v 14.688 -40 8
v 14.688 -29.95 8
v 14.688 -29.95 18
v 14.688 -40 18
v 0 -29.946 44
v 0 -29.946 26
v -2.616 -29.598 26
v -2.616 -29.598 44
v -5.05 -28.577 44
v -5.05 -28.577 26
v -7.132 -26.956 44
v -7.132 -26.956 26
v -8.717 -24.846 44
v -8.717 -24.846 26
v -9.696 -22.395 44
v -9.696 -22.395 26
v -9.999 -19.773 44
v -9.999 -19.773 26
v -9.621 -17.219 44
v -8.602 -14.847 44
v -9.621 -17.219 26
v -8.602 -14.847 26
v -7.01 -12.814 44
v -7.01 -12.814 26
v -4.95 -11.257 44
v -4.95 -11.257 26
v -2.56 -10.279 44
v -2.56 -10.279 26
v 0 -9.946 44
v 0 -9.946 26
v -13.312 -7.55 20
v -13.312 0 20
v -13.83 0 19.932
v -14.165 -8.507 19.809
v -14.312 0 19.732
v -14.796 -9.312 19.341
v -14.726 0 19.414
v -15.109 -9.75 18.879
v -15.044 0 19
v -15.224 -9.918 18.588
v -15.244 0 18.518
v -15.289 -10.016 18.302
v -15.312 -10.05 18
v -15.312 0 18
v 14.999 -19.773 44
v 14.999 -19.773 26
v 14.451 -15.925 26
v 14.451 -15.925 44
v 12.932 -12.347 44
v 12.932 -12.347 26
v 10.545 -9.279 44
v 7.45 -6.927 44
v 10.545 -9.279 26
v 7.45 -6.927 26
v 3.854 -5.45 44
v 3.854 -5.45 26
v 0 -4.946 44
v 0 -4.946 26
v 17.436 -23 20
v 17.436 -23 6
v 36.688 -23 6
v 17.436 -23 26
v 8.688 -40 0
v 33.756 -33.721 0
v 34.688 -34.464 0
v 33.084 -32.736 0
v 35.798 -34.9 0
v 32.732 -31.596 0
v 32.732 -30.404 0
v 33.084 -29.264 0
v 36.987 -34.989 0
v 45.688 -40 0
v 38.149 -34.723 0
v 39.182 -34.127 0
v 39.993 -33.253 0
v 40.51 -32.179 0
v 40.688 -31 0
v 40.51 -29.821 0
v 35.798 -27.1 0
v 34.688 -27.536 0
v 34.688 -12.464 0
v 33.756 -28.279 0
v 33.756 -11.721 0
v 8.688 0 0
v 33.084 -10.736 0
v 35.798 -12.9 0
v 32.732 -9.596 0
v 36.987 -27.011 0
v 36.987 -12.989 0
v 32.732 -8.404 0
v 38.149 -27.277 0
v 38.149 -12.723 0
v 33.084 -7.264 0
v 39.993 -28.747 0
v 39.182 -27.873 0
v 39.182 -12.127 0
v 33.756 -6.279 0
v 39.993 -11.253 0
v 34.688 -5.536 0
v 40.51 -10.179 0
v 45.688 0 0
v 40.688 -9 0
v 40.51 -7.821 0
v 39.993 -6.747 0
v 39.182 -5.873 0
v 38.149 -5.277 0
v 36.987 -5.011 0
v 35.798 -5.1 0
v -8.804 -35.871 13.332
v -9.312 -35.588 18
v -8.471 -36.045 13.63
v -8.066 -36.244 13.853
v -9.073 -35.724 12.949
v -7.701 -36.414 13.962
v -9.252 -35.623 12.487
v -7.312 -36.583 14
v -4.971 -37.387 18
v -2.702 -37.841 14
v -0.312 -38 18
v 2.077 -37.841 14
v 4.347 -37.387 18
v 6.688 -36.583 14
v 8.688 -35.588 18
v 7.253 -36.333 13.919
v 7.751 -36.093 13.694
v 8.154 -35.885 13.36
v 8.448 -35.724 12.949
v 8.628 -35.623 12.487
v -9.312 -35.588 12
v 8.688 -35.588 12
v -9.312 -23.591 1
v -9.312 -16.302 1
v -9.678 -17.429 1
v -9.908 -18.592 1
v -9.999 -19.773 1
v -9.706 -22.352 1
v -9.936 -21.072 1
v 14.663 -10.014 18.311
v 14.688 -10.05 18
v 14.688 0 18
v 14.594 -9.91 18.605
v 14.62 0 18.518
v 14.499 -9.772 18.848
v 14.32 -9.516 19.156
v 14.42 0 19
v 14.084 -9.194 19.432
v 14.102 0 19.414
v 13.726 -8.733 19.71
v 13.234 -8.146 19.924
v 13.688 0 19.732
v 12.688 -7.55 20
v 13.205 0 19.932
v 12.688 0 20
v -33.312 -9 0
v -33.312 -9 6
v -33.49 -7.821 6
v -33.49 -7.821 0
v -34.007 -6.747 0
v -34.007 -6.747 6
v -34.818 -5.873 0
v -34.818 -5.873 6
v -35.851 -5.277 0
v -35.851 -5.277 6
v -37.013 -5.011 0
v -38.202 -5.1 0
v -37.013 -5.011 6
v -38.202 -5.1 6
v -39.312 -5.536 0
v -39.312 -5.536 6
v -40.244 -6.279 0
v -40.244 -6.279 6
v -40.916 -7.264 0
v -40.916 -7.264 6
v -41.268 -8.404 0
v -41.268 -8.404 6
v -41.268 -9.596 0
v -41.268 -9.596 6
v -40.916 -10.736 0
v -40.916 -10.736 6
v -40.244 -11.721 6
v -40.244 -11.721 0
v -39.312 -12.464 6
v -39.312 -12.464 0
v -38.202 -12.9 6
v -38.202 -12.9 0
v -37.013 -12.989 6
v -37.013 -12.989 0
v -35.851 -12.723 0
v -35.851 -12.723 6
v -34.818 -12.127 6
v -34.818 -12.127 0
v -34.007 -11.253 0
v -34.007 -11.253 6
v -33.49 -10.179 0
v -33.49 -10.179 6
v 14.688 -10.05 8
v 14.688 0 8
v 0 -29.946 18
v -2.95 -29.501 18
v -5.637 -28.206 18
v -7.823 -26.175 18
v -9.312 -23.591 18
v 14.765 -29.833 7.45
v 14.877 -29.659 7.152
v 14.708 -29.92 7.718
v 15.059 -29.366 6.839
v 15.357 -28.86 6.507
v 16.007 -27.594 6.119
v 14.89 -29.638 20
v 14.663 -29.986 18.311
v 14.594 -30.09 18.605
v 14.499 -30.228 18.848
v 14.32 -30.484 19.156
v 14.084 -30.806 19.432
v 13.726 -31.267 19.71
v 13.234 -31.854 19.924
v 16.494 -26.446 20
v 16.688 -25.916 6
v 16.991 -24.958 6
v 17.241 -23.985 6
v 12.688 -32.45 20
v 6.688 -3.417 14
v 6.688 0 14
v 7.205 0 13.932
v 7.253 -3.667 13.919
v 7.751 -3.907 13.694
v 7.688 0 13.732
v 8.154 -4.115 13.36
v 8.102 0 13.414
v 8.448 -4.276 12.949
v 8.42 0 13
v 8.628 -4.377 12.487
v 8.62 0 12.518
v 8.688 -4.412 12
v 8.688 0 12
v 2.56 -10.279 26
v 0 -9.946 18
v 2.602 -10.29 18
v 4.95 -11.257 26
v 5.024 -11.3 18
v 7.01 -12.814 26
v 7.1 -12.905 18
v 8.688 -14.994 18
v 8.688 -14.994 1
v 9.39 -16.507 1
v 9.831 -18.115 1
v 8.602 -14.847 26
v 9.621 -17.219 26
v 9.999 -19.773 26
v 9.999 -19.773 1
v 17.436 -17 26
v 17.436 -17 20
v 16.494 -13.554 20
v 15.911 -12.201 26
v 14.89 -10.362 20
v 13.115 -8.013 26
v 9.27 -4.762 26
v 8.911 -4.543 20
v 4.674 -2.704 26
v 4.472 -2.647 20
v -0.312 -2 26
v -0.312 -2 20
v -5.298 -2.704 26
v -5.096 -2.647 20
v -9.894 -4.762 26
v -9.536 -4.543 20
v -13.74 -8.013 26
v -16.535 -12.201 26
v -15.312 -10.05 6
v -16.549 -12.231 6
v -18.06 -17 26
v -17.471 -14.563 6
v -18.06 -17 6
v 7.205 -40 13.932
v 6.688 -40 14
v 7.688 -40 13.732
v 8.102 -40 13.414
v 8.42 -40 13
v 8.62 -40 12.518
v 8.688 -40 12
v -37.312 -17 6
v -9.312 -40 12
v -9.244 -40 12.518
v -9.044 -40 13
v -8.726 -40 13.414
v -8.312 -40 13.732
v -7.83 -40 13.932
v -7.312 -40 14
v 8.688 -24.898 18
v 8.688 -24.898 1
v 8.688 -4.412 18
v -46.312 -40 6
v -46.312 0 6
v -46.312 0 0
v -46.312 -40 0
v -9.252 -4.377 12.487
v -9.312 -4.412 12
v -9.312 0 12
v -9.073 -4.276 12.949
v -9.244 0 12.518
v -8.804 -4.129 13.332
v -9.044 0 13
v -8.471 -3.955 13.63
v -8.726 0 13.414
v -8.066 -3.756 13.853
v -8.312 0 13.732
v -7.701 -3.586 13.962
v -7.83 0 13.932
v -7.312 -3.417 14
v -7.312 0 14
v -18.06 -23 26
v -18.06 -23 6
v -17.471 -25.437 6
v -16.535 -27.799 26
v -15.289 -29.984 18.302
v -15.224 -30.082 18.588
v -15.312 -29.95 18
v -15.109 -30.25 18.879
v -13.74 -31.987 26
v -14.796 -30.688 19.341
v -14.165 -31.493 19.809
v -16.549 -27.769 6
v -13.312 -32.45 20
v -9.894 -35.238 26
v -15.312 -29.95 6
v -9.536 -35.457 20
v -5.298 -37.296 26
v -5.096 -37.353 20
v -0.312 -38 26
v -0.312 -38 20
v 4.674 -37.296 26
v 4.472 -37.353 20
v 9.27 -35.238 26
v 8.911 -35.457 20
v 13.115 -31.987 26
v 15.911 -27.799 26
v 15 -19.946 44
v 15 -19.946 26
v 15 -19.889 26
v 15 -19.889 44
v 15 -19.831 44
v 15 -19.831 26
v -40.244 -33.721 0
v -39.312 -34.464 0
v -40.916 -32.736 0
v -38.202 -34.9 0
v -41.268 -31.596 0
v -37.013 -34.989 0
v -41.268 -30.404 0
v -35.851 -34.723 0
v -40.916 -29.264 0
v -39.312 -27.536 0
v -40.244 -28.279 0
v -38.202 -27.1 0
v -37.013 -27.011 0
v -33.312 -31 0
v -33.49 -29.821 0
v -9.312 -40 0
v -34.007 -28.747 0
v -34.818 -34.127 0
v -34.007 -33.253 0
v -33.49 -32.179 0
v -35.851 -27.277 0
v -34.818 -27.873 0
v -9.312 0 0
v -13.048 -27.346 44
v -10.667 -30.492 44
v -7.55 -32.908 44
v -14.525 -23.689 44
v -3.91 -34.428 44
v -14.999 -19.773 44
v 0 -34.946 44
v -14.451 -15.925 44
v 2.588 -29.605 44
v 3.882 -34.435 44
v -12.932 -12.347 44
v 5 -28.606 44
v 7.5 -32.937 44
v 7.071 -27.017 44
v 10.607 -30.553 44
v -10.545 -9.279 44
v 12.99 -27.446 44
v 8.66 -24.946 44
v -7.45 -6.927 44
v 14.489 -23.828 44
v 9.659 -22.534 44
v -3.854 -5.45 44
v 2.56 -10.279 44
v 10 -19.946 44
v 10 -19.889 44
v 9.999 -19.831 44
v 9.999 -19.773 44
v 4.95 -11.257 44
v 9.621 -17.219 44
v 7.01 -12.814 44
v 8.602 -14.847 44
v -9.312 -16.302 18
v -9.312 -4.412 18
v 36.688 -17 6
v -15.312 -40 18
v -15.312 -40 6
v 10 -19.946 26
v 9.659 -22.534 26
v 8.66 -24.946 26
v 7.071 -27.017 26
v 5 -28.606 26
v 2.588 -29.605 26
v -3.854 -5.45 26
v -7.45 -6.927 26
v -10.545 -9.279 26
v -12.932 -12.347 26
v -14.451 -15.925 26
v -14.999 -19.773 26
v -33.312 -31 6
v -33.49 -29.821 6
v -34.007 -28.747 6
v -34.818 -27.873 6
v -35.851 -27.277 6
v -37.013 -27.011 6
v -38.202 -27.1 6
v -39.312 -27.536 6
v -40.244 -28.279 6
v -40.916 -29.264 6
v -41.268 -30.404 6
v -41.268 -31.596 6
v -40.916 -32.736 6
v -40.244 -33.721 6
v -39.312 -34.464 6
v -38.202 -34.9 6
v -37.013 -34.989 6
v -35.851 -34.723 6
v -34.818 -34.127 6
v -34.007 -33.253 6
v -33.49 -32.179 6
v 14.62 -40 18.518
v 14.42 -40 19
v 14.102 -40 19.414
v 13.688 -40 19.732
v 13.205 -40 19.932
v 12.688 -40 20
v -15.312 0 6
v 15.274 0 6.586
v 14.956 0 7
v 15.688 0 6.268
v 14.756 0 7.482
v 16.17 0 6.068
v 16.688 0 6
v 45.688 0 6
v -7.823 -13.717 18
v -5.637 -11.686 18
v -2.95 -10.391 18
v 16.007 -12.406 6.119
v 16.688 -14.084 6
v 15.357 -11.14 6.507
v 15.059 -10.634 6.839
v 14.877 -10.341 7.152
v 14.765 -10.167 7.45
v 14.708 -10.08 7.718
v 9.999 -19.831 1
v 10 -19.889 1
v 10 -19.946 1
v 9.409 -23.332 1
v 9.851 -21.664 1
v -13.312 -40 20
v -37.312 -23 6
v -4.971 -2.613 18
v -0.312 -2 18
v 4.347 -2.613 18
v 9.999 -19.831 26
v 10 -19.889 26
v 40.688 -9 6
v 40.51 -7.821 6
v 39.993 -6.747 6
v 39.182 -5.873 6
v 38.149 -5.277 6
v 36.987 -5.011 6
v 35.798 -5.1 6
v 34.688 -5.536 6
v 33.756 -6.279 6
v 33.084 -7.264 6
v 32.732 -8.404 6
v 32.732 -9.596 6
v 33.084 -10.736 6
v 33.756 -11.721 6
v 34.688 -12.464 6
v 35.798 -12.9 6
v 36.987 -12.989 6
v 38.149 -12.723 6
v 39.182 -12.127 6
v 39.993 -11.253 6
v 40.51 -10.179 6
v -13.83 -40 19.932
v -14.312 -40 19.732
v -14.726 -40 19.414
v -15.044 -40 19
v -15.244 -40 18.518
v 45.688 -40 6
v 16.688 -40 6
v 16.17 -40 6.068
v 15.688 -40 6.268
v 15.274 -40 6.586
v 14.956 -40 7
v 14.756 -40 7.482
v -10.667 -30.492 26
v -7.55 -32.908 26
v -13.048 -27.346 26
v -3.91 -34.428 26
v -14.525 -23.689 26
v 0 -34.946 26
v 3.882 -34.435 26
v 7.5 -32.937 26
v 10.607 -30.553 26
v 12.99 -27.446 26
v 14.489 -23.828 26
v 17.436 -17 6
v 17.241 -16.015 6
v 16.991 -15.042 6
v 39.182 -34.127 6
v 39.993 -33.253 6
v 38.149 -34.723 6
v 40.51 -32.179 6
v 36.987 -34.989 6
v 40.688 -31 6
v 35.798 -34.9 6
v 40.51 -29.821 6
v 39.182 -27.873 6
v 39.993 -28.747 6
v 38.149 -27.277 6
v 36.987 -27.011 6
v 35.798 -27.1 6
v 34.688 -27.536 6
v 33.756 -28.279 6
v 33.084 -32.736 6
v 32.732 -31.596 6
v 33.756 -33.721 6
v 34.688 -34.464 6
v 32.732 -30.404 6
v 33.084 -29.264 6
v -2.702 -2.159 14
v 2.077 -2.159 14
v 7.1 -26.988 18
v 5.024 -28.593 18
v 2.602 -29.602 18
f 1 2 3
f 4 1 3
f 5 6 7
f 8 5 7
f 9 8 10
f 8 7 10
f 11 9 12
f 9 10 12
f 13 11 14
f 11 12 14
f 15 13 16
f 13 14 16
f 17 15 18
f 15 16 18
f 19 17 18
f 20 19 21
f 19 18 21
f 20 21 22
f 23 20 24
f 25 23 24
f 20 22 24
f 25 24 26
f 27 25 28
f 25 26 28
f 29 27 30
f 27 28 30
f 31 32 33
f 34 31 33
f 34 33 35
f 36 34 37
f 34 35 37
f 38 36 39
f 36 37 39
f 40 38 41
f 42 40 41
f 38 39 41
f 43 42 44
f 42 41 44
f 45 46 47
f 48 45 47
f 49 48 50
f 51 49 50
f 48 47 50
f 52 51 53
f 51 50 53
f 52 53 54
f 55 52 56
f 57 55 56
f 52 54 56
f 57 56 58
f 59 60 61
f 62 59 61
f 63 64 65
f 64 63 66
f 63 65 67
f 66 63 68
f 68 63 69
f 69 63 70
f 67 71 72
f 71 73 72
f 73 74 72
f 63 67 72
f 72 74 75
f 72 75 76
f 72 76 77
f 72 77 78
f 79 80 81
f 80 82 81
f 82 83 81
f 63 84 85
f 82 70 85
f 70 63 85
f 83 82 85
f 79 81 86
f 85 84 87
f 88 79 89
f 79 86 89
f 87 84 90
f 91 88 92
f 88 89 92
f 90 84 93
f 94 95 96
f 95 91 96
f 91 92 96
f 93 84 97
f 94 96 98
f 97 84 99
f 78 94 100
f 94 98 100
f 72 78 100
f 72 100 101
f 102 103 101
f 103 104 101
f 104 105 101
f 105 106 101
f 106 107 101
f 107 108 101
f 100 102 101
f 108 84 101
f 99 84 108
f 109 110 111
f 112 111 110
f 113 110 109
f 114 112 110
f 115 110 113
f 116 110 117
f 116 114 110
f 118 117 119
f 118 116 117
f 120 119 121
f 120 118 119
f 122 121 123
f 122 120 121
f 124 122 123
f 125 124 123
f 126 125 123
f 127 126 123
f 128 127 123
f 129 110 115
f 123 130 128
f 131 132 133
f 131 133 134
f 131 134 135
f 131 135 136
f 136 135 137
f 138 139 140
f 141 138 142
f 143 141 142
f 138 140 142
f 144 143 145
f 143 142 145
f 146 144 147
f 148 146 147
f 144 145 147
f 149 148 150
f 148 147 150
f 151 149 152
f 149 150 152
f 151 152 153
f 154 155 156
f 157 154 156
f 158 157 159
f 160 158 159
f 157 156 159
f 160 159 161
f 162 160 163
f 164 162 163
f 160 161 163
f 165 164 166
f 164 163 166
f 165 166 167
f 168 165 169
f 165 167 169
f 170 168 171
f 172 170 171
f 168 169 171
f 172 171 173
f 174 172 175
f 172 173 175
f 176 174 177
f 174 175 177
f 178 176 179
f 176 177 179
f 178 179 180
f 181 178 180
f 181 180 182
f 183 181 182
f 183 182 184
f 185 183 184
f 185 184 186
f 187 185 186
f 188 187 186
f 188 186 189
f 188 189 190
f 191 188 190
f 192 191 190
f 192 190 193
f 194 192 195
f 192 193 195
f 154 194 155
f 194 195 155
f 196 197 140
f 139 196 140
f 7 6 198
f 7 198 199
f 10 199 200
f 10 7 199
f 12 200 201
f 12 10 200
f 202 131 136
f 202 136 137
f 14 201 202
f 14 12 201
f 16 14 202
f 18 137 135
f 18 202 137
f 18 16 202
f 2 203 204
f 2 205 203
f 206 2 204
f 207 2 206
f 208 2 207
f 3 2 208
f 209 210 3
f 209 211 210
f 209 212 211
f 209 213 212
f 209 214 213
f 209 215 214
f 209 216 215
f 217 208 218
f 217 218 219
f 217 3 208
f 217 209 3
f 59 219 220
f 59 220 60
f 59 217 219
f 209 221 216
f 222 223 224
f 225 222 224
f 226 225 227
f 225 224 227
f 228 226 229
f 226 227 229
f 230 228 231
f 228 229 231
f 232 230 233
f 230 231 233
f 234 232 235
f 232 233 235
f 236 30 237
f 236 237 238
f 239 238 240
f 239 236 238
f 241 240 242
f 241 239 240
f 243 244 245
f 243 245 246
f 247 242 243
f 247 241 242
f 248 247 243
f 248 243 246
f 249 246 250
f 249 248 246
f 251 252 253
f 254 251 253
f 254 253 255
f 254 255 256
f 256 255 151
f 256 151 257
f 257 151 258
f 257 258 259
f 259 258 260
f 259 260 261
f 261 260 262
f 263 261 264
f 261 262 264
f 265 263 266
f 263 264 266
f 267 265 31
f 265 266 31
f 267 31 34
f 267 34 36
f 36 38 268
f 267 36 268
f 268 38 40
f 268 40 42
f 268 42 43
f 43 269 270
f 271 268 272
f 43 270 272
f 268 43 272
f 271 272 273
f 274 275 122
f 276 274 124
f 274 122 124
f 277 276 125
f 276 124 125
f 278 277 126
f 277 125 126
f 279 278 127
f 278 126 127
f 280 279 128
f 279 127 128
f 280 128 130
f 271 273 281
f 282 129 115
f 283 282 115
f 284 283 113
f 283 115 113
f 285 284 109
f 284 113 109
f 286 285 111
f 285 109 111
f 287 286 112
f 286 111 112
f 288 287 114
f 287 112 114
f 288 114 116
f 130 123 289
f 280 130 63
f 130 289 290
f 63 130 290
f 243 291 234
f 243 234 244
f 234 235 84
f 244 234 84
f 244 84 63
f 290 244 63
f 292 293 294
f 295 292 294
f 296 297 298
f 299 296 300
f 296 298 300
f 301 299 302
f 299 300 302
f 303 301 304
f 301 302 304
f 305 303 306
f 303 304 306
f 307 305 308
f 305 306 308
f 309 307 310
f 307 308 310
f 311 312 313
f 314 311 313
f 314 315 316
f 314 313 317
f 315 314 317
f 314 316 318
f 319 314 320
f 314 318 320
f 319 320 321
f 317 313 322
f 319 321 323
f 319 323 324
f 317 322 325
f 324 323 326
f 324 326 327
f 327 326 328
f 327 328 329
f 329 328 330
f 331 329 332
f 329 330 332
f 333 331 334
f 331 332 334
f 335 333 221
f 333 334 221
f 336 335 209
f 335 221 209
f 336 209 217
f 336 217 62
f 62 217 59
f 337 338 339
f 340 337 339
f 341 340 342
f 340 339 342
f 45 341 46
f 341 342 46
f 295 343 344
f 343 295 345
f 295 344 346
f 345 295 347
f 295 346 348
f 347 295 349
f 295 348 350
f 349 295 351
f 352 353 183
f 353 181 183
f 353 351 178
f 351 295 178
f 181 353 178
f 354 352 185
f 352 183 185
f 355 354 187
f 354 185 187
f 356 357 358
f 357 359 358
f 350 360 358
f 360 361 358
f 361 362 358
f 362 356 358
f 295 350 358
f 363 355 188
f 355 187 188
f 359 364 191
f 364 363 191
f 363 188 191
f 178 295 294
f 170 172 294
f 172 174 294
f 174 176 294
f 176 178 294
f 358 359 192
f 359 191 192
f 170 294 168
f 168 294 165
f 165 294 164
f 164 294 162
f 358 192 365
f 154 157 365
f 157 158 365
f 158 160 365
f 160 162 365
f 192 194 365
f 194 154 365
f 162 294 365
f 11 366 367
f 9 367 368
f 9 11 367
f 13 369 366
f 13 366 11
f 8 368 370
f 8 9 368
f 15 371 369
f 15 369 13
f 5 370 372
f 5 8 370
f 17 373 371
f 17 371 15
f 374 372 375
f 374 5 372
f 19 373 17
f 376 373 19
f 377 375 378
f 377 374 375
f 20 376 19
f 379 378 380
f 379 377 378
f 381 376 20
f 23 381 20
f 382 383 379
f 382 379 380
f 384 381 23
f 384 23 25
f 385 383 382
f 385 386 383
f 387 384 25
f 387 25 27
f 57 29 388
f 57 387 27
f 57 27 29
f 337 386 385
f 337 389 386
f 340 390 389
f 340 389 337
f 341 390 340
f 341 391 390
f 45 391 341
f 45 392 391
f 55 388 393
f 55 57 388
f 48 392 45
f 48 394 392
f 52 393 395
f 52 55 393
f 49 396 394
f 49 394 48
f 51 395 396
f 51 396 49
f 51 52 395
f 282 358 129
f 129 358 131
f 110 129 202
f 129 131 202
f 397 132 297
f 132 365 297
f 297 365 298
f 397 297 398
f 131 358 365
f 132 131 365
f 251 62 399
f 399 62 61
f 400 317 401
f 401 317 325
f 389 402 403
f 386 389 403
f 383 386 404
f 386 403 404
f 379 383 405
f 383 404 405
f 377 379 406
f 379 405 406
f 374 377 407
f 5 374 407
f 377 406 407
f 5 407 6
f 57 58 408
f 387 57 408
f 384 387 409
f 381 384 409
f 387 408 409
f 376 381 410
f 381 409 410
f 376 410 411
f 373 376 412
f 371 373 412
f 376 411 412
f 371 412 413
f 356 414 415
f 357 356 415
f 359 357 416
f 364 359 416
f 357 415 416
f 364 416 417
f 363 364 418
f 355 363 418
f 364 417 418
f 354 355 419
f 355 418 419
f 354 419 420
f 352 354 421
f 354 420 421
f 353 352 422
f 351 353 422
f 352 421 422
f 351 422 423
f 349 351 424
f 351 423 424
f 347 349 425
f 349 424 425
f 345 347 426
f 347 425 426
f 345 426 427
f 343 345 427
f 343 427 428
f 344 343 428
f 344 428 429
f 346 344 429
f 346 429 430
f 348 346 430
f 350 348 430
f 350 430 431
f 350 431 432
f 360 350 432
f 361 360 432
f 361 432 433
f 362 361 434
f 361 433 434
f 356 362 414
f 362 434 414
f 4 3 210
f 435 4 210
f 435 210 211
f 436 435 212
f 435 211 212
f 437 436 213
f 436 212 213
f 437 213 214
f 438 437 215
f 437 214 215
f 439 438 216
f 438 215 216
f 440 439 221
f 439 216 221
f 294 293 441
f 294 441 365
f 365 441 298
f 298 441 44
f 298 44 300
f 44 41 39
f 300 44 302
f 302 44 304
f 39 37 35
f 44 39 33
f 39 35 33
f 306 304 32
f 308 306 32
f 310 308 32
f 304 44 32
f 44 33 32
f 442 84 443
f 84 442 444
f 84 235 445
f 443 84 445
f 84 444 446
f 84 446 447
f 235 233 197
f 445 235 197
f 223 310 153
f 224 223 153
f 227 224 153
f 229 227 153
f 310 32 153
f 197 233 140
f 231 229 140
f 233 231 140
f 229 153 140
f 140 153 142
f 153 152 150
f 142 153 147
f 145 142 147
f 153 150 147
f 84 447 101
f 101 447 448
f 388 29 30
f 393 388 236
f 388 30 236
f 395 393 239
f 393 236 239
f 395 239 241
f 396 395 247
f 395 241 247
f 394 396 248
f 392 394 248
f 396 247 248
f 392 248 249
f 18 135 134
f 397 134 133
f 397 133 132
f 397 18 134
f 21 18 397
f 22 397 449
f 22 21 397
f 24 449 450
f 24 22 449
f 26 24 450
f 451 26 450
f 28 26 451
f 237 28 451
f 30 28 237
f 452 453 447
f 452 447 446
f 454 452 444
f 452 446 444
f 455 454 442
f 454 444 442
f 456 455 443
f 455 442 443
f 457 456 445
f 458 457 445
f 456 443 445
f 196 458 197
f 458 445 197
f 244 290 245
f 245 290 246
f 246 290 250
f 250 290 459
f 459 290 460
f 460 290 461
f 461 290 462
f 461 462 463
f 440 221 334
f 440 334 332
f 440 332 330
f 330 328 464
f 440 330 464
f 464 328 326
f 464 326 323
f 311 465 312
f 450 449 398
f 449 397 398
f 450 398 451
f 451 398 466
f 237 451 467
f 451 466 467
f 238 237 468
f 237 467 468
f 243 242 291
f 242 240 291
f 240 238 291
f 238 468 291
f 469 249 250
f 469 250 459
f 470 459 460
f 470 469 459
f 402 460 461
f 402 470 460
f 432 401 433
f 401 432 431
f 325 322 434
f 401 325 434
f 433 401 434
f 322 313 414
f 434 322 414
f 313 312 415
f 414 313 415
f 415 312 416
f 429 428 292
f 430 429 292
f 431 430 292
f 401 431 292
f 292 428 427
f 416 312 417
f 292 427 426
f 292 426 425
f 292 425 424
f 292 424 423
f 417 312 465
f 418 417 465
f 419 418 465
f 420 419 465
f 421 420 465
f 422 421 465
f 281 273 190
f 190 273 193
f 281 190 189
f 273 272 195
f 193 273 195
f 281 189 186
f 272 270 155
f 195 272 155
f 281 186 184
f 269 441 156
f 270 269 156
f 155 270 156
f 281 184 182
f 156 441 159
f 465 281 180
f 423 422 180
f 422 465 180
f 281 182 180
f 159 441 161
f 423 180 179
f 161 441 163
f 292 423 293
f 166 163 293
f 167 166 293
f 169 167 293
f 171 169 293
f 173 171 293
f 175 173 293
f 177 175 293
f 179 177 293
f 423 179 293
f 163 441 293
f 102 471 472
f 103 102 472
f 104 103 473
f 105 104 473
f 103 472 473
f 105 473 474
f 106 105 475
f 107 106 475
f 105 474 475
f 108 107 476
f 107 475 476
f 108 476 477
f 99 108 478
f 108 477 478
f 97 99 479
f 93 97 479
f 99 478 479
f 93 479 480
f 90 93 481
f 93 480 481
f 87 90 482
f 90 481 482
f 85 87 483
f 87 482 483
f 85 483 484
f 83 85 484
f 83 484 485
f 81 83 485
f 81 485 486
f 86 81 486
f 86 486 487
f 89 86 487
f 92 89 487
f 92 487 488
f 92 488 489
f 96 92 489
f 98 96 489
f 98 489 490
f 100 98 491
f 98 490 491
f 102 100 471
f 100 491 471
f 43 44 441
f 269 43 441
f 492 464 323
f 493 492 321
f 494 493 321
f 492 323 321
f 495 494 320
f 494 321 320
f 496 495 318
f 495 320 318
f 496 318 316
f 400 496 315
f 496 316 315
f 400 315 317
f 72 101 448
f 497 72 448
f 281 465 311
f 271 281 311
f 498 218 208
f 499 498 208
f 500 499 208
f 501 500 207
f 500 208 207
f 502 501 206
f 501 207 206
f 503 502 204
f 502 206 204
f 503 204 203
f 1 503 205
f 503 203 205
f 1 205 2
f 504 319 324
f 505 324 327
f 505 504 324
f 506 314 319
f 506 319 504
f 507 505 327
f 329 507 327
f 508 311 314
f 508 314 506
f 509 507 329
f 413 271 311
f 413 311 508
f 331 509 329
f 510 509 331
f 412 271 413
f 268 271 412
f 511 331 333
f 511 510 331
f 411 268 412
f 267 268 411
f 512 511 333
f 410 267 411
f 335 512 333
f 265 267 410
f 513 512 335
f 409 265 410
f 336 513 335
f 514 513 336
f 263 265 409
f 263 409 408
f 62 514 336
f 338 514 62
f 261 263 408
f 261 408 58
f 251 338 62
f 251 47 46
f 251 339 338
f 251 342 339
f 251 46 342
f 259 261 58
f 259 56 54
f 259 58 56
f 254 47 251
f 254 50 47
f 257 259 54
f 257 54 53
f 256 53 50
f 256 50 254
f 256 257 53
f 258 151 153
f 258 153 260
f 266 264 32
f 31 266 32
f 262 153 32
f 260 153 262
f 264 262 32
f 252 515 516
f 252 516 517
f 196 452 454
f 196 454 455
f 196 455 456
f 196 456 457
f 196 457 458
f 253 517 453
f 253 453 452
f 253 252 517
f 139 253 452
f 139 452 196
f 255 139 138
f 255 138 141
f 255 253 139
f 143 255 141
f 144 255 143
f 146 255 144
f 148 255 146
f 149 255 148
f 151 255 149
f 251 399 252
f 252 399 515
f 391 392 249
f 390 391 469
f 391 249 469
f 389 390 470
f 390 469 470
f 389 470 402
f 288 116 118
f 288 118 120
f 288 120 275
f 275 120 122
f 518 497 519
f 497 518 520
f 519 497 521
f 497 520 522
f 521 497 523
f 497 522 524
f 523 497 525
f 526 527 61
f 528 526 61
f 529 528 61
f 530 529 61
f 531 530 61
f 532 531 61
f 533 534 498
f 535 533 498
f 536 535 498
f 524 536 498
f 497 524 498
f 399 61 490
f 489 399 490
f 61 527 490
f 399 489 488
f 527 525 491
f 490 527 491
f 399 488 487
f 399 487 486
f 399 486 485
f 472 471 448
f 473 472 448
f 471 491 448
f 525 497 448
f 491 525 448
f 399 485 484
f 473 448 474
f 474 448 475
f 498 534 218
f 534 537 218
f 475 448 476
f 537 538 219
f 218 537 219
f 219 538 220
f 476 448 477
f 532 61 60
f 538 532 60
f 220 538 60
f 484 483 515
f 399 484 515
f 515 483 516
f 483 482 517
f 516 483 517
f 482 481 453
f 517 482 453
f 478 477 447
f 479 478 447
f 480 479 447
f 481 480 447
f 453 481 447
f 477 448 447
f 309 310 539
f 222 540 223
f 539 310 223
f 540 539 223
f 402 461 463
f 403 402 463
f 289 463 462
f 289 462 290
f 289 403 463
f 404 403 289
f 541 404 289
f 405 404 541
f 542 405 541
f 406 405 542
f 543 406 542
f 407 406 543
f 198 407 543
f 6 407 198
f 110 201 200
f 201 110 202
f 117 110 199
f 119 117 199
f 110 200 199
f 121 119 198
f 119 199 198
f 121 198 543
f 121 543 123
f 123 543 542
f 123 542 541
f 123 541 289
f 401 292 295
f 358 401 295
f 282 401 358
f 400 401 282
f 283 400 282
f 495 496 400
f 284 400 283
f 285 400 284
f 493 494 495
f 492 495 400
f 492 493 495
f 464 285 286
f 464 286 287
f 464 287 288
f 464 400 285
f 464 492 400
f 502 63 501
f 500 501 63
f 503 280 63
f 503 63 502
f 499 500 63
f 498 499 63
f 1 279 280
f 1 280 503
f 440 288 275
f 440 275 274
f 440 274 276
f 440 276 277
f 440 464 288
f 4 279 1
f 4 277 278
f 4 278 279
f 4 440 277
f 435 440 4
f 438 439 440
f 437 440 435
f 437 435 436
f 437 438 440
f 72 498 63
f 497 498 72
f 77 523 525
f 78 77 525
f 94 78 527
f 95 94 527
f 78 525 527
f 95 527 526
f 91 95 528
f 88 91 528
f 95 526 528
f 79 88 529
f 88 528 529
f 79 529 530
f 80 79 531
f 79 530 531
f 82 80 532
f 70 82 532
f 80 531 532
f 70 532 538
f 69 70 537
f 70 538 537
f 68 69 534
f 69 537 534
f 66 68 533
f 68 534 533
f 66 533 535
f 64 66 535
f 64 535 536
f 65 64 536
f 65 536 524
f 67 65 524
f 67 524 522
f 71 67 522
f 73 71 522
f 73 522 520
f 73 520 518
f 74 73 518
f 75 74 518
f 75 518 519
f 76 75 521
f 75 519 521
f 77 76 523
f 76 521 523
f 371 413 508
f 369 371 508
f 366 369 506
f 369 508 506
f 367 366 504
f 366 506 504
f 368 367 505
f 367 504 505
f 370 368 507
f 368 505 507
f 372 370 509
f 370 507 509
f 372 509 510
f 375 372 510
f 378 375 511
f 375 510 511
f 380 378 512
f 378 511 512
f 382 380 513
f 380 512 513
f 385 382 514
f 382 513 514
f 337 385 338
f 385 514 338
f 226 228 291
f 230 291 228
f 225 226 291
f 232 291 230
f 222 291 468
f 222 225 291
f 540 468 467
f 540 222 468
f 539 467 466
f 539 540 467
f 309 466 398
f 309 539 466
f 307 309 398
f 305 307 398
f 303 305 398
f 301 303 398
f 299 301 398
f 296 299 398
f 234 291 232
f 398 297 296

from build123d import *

# Parameters (mm, degrees)
F1_DEPTH  = 40
F14_R     = 4
F2_DEPTH  = 6
F3_R      = 4
F15_DEPTH = 6
F16_DEPTH = 14
F6_DEPTH  = 6
F17_DEPTH = 18
F18_DEPTH = 25
F8_DEPTH  = 20
F9_DEPTH  = 20
F10_DEPTH = 6
F12_DEPTH = 6
F13_DEPTH = 12


with BuildPart() as f1:
    # F0 (on Front) → F1 (new body)
    with BuildSketch(Plane.XZ):
        with BuildLine():
            Line((8.6878103536, 0), (45.6878103536, 0))
            Line((45.6878103536, 0), (45.6878103536, 6))
            Line((45.6878103536, 6), (16.6878103536, 6))
            ThreePointArc((16.6878103536, 6), (15.2735967912, 6.5857864376), (14.6878103536, 8))
            Line((14.6878103536, 8), (14.6878103536, 18))
            ThreePointArc((14.6878103536, 18), (14.102023916, 19.4142135624), (12.6878103536, 20))
            Line((12.6878103536, 20), (-13.3121896464, 20))
            ThreePointArc((-13.3121896464, 20), (-14.7264032088, 19.4142135624), (-15.3121896464, 18))
            Line((-15.3121896464, 18), (-15.3121896464, 6))
            Line((-15.3121896464, 6), (-46.3121896464, 6))
            Line((-46.3121896464, 6), (-46.3121896464, 0))
            Line((-46.3121896464, 0), (-9.3121896464, 0))
            Line((-9.3121896464, 0), (-9.3121896464, 12))
            ThreePointArc((-9.3121896464, 12), (-8.7264032088, 13.4142135624), (-7.3121896464, 14))
            Line((-7.3121896464, 14), (6.6878103536, 14))
            ThreePointArc((6.6878103536, 14), (8.102023916, 13.4142135624), (8.6878103536, 12))
            Line((8.6878103536, 12), (8.6878103536, 0))
        make_face()
    extrude(amount=F1_DEPTH)

    # F14 (on face) → F2 (cut)
    with BuildSketch(Plane.XY.offset(6)):
        with Locations((-37.3121896464, -31)):
            Circle(F14_R)
        with Locations((-37.3121896464, -9)):
            Circle(F14_R)
    extrude(amount=-F2_DEPTH, mode=Mode.SUBTRACT)

    # F3 (on face) → F15 (cut)
    with BuildSketch(Plane.XY.offset(6)):
        with Locations((36.6878103536, -31)):
            Circle(F3_R)
        with Locations((36.6878103536, -9)):
            Circle(F3_R)
    extrude(amount=-F15_DEPTH, mode=Mode.SUBTRACT)

    # F4 (on face) → F16 (join)
    with BuildSketch(Plane.XY.offset(20)):
        with BuildLine():
            Line((12.6878103536, -32.449899598), (12.6878103536, -7.550100402))
            ThreePointArc((12.6878103536, -7.550100402), (-0.3121896464, -2), (-13.3121896464, -7.550100402))
            Line((-13.3121896464, -7.550100402), (-13.3121896464, -32.449899598))
            ThreePointArc((-13.3121896464, -32.449899598), (-0.3121896464, -38), (12.6878103536, -32.449899598))
        make_face()
        with BuildLine():
            Line((-13.3121896464, -32.449899598), (-13.3121896464, -7.550100402))
            ThreePointArc((-13.3121896464, -7.550100402), (-18.3121896464, -20), (-13.3121896464, -32.449899598))
        make_face()
        with BuildLine():
            ThreePointArc((12.6878103536, -32.449899598), (16.3911034421, -26.7082039325), (17.6878103536, -20))
            ThreePointArc((17.6878103536, -20), (16.3911034421, -13.2917960675), (12.6878103536, -7.550100402))
            Line((12.6878103536, -7.550100402), (12.6878103536, -32.449899598))
        make_face()
    extrude(amount=-F16_DEPTH)

    # F5 (on face) → F6 (join)
    with BuildSketch(Plane.XY.offset(20)):
        with BuildLine():
            ThreePointArc((12.6878103536, -32.449899598), (16.3911034421, -26.7082039325), (17.6878103536, -20))
            ThreePointArc((17.6878103536, -20), (16.3911034421, -13.2917960675), (12.6878103536, -7.550100402))
            ThreePointArc((12.6878103536, -7.550100402), (-0.3121896464, -2), (-13.3121896464, -7.550100402))
            ThreePointArc((-13.3121896464, -7.550100402), (-18.3121896464, -20), (-13.3121896464, -32.449899598))
            ThreePointArc((-13.3121896464, -32.449899598), (-0.3121896464, -38), (12.6878103536, -32.449899598))
        make_face()
    extrude(amount=F6_DEPTH)

    # F7 (on face) → F17 (join)
    with BuildSketch(Plane.XY.offset(26)):
        with BuildLine():
            Line((-9.9985091191, -19.7734791318), (-14.9990061206, -19.7734791318))
            ThreePointArc((-14.9990061206, -19.7734791318), (-10.6674755741, -30.4915269508), (0, -34.9461504817))
            Line((0, -34.9461504817), (0, -29.9461504817))
            ThreePointArc((0, -29.9461504817), (-7.1318550707, -26.9559039189), (-9.9985091191, -19.7734791318))
        make_face()
        with BuildLine():
            ThreePointArc((15, -19.9461504817), (14.9997515281, -19.8598133766), (14.9990061206, -19.7734791318))
            Line((14.9990061206, -19.7734791318), (9.9985091191, -19.7734791318))
            ThreePointArc((9.9985091191, -19.7734791318), (9.9996272728, -19.8598115887), (10, -19.9461504817))
            ThreePointArc((10, -19.9461504817), (7.0710678119, -27.0172182936), (0, -29.9461504817))
            Line((0, -29.9461504817), (0, -34.9461504817))
            ThreePointArc((0, -34.9461504817), (10.6066017178, -30.5527521995), (15, -19.9461504817))
        make_face()
        with BuildLine():
            ThreePointArc((14.9990061206, -19.7734791318), (10.5453764691, -9.2786749076), (0, -4.9461504817))
            Line((0, -4.9461504817), (0, -9.9461504817))
            ThreePointArc((0, -9.9461504817), (7.0097534372, -12.814295411), (9.9985091191, -19.7734791318))
            Line((9.9985091191, -19.7734791318), (14.9990061206, -19.7734791318))
        make_face()
        with BuildLine():
            Line((0, -9.9461504817), (0, -4.9461504817))
            ThreePointArc((0, -4.9461504817), (-10.5453764691, -9.2786749076), (-14.9990061206, -19.7734791318))
            Line((-14.9990061206, -19.7734791318), (-9.9985091191, -19.7734791318))
            ThreePointArc((-9.9985091191, -19.7734791318), (-7.0097534372, -12.814295411), (0, -9.9461504817))
        make_face()
    extrude(amount=F17_DEPTH)

    # F18 (cut): a face of the model
    f18_faces = [f1.faces().sort_by_distance(p)[0] for p in [
        (0, -19.9461504817, 26),
    ]]
    extrude(f18_faces, amount=-F18_DEPTH, mode=Mode.SUBTRACT)

    # F19 (on face) → F8 (join)
    with BuildSketch(Plane.XY.offset(6)):
        with BuildLine():
            Line((36.6878103536, -23), (36.6878103536, -17))
            Line((36.6878103536, -17), (17.4360497029, -17))
            ThreePointArc((17.4360497029, -17), (17.6878103536, -20), (17.4360497029, -23))
            Line((17.4360497029, -23), (36.6878103536, -23))
        make_face()
    extrude(amount=F8_DEPTH)

    # F20 (on face) → F9 (join)
    with BuildSketch(Plane.XY.offset(6)):
        with BuildLine():
            Line((-18.0604289957, -17), (-37.3121896464, -17))
            Line((-37.3121896464, -17), (-37.3121896464, -23))
            Line((-37.3121896464, -23), (-18.0604289957, -23))
            ThreePointArc((-18.0604289957, -23), (-18.3121896464, -20), (-18.0604289957, -17))
        make_face()
    extrude(amount=F9_DEPTH)

    # F21 (on face) → F10 (cut)
    with BuildSketch(Plane.XZ.offset(23)):
        Polygon((17.4360497029, 26), (36.6878103536, 6), (36.6878103536, 26), align=None)
    extrude(amount=-F10_DEPTH, mode=Mode.SUBTRACT)

    # F11 (on face) → F12 (cut)
    with BuildSketch(Plane.XZ.offset(23)):
        Polygon((-37.3121896464, 26), (-37.3121896464, 6), (-18.0604289957, 26), align=None)
    extrude(amount=-F12_DEPTH, mode=Mode.SUBTRACT)

    # F13 (cut): faces of the model
    f13_faces = [f1.faces().sort_by_distance(p)[0] for p in [
        (-0.4565347665, -7.2840433998, 6),
        (-0.4547848435, -32.6635017138, 6),
        (-0.4565347665, -7.2840433998, 6),
        (-0.4547848435, -32.6635017138, 6),
    ]]
    extrude(f13_faces, amount=-F13_DEPTH, mode=Mode.SUBTRACT)


solid = f1.part
